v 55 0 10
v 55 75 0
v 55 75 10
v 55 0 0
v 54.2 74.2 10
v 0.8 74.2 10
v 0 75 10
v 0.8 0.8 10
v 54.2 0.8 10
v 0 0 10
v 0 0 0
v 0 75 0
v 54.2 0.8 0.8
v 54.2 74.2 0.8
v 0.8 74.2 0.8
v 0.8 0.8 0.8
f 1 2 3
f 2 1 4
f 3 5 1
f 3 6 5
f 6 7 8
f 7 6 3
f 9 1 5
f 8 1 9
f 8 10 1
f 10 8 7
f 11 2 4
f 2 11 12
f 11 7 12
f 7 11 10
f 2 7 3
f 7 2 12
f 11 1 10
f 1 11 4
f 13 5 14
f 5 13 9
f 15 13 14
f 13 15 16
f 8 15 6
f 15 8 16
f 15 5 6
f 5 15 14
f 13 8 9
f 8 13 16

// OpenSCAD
w=0.4*2;


difference()
{
    cube([55, 75,10]);
    translate([w,w,w])
    cube([55-2*w, 75-2*w,10]);
}
